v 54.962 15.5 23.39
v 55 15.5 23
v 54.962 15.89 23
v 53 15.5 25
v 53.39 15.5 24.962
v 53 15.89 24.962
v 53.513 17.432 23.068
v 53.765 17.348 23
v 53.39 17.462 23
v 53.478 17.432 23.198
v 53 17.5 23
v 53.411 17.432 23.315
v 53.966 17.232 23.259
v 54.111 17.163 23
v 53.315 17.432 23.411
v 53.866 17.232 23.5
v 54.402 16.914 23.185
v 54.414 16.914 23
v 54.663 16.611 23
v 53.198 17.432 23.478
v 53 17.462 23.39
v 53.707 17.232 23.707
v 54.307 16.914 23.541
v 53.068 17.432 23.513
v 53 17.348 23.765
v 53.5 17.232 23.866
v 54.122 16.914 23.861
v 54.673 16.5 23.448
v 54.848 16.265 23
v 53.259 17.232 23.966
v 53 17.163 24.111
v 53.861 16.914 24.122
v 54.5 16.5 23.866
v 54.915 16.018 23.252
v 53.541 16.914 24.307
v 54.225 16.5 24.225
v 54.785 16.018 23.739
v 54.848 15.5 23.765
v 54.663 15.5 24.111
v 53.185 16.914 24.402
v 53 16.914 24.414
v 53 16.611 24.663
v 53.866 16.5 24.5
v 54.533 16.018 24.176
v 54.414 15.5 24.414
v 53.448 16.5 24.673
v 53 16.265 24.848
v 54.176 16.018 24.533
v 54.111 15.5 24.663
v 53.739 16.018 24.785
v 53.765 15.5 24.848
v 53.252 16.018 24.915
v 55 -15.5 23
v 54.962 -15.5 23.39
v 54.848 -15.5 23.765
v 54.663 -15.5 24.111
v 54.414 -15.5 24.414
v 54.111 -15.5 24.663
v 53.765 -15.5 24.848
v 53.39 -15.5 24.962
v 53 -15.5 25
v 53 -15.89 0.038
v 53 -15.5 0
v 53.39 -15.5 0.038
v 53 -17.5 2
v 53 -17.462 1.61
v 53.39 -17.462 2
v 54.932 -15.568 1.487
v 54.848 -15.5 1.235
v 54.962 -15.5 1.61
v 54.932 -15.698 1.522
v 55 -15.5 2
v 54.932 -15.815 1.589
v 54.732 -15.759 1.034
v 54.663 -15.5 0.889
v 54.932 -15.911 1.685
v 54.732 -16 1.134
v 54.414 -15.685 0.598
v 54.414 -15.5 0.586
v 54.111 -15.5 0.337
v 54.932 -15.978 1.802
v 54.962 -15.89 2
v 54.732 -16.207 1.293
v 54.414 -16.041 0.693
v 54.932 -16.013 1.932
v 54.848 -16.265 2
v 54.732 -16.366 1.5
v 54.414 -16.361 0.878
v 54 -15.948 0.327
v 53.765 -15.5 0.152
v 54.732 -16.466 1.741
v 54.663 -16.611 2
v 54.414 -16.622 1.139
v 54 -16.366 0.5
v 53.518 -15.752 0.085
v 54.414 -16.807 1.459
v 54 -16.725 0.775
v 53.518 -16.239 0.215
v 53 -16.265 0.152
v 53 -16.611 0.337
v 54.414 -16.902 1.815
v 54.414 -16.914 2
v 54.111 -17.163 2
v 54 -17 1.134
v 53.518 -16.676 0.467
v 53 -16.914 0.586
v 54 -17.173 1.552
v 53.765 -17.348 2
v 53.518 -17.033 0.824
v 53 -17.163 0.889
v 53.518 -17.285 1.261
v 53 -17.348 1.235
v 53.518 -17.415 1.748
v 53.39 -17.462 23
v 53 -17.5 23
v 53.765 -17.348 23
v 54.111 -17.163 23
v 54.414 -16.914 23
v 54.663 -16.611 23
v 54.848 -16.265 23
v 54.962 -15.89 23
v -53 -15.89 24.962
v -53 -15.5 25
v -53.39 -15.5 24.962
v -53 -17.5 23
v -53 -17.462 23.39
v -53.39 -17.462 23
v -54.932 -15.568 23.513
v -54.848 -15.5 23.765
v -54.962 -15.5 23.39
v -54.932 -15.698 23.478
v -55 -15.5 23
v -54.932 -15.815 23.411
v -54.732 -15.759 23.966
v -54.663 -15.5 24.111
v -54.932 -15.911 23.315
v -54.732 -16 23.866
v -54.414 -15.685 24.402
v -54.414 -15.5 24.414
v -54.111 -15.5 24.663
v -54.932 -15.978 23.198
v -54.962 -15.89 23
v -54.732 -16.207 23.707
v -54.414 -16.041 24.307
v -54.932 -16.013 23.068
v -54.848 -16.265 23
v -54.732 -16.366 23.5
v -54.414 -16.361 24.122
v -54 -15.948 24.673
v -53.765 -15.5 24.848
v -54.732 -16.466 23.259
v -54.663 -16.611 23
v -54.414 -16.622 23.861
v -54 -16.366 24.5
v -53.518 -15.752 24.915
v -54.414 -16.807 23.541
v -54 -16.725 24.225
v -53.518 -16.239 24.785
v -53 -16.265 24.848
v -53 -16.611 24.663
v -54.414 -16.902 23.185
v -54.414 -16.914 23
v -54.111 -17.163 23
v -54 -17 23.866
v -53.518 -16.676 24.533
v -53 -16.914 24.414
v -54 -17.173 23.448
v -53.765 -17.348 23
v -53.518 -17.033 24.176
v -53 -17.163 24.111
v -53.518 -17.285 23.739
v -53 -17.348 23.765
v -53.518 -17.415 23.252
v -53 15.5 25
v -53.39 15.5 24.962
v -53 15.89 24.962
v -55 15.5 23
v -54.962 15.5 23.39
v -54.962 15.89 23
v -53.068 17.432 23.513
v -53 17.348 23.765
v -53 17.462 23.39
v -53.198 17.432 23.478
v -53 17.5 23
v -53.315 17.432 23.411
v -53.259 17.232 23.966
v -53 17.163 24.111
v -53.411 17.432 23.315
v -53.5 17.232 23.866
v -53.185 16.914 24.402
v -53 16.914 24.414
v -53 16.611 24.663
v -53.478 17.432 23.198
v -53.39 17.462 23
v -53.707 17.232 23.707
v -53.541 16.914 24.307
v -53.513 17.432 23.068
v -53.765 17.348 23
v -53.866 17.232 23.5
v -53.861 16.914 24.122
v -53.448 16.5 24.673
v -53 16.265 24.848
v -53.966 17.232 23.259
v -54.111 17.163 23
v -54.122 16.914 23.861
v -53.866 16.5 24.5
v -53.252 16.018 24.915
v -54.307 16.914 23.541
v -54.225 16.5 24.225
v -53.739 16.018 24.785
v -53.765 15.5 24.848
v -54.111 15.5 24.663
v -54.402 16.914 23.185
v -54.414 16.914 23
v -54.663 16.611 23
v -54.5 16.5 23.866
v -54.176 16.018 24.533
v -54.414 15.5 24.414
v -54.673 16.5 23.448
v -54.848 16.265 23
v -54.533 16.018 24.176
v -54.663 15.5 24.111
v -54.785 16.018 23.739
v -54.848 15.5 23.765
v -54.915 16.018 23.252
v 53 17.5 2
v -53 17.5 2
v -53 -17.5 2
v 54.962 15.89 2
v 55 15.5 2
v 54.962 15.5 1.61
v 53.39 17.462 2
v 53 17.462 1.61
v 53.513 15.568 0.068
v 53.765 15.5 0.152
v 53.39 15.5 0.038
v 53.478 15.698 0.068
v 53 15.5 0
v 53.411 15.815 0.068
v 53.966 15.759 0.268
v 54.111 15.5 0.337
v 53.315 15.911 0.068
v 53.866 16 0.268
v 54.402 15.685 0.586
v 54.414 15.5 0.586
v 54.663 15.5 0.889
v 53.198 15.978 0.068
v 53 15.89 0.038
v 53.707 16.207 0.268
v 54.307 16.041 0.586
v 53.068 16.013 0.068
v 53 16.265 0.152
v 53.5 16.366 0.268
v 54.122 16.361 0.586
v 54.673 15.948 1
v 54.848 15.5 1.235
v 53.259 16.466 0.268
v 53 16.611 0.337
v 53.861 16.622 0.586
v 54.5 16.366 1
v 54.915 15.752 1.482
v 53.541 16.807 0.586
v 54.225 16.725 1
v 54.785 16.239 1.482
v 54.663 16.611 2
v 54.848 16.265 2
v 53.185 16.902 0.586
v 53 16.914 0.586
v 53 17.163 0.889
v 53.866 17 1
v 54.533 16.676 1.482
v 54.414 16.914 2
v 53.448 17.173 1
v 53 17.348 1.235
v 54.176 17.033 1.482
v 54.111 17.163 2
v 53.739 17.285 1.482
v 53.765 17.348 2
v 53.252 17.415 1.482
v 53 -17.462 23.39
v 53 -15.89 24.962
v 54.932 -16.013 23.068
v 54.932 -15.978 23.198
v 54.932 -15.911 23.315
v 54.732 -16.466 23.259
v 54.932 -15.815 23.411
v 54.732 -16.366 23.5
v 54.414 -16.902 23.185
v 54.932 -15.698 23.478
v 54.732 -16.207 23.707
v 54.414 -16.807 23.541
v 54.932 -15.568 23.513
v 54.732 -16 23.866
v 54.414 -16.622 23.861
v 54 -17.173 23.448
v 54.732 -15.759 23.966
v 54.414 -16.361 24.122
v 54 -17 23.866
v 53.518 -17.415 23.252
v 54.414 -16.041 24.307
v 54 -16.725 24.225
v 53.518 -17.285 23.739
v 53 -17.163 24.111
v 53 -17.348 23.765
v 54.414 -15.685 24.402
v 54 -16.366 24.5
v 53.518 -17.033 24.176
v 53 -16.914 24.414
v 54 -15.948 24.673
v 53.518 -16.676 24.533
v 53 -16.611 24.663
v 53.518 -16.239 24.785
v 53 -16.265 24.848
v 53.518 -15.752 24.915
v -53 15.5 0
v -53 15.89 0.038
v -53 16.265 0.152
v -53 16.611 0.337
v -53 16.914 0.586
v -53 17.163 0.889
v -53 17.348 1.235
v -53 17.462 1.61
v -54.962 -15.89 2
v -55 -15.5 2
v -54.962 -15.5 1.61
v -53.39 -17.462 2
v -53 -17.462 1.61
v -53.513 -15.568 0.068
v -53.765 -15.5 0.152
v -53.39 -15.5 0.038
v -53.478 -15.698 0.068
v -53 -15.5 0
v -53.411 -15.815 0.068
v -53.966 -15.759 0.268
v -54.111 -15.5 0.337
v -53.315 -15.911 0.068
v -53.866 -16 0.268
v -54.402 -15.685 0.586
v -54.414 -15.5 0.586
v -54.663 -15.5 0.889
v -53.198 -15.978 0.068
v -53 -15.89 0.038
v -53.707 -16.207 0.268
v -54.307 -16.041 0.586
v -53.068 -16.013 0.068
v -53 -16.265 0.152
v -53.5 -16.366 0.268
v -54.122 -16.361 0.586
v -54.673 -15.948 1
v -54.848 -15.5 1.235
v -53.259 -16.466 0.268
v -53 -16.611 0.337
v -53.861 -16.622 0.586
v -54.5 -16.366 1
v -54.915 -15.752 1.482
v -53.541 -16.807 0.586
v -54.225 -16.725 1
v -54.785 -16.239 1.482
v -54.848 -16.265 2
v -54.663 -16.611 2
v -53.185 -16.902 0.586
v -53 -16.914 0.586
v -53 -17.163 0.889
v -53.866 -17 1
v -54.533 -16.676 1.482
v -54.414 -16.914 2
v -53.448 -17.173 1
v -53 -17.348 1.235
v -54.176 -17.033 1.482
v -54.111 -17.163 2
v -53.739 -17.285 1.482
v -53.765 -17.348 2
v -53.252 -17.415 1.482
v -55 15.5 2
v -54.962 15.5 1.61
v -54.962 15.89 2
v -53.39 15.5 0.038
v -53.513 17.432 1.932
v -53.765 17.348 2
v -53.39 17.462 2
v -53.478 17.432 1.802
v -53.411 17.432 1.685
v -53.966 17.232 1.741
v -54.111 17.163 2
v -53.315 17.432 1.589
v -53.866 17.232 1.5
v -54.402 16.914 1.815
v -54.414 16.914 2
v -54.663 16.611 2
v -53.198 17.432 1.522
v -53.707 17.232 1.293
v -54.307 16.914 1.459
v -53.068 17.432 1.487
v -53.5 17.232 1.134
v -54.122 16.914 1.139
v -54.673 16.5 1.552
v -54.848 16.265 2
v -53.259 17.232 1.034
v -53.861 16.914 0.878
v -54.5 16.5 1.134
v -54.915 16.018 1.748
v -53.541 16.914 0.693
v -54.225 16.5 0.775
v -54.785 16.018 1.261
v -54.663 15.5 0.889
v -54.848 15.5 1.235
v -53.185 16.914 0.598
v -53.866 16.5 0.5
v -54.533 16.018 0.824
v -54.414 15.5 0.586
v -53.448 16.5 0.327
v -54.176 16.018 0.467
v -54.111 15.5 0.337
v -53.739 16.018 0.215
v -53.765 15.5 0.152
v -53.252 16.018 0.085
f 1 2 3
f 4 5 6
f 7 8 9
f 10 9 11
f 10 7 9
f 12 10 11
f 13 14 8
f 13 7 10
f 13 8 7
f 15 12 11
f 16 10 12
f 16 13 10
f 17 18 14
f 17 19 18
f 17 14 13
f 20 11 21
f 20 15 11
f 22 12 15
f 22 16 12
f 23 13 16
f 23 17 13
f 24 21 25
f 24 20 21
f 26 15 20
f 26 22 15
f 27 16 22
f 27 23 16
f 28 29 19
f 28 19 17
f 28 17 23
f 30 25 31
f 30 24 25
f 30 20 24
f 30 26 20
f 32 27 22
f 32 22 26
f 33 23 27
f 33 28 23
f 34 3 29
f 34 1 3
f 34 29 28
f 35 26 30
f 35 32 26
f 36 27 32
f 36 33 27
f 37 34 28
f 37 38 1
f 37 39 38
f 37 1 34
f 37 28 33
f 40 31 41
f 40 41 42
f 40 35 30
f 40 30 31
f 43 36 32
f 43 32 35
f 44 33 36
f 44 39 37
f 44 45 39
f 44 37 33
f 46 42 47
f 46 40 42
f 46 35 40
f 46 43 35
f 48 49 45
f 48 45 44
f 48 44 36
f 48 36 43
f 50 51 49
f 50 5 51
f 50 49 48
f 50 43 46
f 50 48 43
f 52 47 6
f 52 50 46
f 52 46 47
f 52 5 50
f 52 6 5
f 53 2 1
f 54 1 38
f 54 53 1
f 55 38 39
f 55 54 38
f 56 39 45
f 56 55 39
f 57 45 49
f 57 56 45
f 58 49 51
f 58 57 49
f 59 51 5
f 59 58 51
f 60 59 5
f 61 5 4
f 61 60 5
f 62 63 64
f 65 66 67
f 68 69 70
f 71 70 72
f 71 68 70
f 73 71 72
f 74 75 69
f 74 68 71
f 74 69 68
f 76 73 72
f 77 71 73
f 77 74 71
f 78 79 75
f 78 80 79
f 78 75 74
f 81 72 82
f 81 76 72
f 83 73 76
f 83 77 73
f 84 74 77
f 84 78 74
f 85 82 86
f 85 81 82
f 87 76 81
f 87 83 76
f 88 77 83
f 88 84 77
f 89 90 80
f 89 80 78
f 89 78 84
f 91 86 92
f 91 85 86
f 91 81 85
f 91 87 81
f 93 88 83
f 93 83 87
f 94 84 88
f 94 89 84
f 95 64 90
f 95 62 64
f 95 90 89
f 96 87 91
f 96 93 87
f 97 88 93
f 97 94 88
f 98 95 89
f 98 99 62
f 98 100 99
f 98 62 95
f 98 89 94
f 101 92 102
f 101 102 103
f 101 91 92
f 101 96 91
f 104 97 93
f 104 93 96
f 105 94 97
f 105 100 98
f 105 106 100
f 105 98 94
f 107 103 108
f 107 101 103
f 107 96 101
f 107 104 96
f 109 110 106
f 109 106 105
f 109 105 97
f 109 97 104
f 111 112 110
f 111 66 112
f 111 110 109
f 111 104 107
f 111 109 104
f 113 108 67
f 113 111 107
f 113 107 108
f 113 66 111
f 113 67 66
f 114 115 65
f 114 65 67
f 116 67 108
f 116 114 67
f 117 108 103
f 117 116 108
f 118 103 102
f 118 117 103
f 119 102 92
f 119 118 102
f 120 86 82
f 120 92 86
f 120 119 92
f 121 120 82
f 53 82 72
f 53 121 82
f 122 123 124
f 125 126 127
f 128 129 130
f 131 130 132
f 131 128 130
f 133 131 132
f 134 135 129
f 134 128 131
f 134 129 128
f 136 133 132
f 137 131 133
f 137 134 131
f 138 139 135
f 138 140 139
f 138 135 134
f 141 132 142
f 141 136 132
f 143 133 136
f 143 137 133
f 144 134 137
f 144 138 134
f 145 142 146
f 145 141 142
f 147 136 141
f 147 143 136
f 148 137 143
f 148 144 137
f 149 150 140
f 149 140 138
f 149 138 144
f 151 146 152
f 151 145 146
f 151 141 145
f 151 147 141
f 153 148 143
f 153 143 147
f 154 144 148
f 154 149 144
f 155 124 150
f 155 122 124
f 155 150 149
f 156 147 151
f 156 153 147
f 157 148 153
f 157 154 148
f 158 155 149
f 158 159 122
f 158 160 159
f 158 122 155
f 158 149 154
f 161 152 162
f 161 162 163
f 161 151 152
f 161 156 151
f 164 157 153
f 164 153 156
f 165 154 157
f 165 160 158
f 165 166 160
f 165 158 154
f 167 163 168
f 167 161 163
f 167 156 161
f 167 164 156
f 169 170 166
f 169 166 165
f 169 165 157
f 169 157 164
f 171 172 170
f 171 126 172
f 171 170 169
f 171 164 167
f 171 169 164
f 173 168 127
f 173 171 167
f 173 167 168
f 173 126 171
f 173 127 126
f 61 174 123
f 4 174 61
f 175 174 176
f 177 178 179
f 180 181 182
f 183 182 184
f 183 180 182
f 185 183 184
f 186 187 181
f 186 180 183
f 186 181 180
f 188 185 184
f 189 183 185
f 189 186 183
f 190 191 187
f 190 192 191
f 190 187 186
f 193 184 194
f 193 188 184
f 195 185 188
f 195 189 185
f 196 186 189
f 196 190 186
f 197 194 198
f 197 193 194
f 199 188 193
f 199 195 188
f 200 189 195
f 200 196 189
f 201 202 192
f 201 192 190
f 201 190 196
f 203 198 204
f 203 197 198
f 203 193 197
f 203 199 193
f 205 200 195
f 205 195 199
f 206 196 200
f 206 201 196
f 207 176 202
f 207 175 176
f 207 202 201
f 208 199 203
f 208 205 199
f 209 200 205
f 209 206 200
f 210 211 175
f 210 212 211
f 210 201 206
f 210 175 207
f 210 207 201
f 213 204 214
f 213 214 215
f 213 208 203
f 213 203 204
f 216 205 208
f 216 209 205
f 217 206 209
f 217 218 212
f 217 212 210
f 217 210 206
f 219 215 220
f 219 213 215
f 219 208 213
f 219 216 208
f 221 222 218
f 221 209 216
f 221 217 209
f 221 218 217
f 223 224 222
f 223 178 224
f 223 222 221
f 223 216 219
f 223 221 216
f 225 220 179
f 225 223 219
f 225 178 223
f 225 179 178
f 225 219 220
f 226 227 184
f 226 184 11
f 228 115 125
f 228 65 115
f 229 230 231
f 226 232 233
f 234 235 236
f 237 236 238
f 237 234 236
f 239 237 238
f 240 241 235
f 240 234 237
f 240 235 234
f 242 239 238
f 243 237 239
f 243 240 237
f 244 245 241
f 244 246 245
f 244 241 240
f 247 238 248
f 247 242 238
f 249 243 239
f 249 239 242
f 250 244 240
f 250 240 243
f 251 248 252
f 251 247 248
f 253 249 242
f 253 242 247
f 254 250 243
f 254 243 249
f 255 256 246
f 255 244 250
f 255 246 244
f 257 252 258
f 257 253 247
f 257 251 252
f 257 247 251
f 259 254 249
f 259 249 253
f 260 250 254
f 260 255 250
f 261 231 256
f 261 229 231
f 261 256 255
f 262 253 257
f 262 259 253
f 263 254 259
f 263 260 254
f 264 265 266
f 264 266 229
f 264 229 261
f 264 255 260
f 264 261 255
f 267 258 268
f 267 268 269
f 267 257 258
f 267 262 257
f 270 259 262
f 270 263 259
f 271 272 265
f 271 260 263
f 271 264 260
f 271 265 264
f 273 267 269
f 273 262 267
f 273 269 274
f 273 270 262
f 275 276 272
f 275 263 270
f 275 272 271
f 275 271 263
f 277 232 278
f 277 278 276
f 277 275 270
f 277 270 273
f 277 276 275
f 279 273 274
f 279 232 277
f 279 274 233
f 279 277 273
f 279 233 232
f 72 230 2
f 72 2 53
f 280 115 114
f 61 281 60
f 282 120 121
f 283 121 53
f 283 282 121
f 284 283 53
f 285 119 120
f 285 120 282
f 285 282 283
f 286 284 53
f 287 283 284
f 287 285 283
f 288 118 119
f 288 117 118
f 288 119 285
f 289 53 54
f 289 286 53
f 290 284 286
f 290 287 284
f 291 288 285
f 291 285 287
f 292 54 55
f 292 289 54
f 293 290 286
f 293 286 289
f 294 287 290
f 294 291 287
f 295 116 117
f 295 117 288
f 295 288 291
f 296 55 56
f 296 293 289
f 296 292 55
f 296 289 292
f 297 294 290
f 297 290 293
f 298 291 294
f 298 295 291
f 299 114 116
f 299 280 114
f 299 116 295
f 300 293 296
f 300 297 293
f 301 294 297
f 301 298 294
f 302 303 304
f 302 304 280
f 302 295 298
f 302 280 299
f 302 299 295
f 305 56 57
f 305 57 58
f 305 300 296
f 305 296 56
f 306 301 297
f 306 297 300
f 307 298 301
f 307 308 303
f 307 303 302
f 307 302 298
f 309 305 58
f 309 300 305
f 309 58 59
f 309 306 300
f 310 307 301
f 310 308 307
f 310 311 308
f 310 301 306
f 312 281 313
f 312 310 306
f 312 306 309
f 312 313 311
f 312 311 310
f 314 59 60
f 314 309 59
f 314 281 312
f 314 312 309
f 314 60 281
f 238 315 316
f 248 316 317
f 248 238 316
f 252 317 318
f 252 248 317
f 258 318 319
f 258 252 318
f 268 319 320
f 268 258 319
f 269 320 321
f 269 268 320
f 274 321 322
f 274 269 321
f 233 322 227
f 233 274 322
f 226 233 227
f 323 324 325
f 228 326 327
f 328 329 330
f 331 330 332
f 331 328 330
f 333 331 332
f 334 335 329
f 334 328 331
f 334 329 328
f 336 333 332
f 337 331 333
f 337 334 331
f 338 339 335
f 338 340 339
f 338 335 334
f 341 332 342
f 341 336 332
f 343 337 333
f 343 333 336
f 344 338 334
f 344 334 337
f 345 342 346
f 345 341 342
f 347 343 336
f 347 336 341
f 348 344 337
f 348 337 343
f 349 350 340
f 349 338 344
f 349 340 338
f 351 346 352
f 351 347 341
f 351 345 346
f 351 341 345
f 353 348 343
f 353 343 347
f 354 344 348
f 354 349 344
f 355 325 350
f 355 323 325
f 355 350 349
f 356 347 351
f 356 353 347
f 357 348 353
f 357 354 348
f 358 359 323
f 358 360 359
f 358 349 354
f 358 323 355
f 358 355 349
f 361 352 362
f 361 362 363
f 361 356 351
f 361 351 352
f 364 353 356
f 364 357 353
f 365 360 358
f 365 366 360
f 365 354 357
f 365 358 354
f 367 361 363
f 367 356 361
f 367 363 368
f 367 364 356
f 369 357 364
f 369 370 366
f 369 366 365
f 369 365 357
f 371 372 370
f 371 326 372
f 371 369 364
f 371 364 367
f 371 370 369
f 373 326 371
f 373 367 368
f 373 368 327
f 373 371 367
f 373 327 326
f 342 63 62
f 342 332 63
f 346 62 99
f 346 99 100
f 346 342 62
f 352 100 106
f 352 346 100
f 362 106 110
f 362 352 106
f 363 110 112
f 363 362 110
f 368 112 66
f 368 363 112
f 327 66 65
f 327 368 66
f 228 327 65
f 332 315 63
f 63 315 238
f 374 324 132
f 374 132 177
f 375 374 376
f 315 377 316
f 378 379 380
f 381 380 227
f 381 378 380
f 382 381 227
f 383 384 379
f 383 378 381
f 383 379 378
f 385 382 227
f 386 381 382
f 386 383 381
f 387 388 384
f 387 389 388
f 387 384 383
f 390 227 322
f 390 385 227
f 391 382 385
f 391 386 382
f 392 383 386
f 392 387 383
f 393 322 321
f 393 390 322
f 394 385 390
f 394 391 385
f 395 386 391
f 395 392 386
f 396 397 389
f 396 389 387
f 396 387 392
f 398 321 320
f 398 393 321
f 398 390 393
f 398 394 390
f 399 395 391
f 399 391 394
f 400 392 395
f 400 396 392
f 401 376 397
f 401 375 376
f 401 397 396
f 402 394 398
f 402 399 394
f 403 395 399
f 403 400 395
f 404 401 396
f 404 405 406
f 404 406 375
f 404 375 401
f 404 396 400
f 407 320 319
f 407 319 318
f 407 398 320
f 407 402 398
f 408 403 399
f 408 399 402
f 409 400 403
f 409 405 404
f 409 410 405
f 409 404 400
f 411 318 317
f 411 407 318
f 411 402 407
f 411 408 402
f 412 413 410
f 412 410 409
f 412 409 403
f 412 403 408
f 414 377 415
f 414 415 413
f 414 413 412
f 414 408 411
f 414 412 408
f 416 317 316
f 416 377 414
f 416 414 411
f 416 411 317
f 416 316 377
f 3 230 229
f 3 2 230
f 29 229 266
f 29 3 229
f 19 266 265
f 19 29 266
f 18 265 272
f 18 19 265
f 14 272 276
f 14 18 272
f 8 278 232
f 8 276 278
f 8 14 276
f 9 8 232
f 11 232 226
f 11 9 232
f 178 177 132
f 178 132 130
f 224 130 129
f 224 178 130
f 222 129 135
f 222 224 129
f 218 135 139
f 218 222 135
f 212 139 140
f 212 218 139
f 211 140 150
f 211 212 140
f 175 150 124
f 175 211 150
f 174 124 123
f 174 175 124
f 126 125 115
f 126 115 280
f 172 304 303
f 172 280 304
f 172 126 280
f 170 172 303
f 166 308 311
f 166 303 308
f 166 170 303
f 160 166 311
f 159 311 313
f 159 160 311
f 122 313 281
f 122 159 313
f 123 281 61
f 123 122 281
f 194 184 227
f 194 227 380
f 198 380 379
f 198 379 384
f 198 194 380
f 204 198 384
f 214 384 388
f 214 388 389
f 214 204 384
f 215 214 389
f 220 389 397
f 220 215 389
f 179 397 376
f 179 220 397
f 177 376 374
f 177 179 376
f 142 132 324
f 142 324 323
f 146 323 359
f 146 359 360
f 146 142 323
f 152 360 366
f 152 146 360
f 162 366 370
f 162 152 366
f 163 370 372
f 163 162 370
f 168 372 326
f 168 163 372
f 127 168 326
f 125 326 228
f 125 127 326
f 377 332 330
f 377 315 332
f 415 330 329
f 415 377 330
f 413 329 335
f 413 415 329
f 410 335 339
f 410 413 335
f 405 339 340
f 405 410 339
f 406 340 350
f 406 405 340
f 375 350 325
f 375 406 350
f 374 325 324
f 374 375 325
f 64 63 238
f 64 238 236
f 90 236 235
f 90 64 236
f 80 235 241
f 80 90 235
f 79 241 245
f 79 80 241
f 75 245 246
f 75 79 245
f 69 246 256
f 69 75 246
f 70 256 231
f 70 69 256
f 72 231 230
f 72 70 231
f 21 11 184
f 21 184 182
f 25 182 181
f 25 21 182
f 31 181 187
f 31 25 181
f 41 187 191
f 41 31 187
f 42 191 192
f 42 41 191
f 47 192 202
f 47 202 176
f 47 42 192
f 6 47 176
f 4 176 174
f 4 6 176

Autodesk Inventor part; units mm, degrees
ref_plane "YZ Plane" through (0, 0, 0) normal (1, 0, 0) x (0, 1, 0)
ref_plane "XZ Plane" through (0, 0, 0) normal (0, 1, 0) x (-1, 0, 0)
ref_plane "XY Plane" through (0, 0, 0) normal (0, 0, 1) x (1, 0, 0)
sketch "Sketch2" plane through (0, 0, 0) normal (0, 0, 1) x (1, 0, 0)
  line L0 (-55, 17.5) -> (55, 17.5)
  line L1 (55, 17.5) -> (55, -17.5)
  line L2 (55, -17.5) -> (-55, -17.5)
  line L3 (-55, -17.5) -> (-55, 17.5)
  line L4 (-55, 17.5) -> (55, -17.5) construction
  line L5 (55, 17.5) -> (-55, -17.5) construction
  point P0 (0, 0)
  dimension "d0" = 110
  dimension "d1" = 35
extrude "Extrusion1" add sketch "Sketch2" along normal blind 25
fillet "Fillet1" radius 2 12 edges at (0, -17.5, 25) (-55, 0, 25) (-55, -17.5, 12.5) (-55, 0, 0) (0, -17.5, 0) (55, 0, 25) (55, 17.5, 12.5) (0, 17.5, 25) (0, 17.5, 0) (55, 0, 0) (55, -17.5, 12.5) (-55, 17.5, 12.5)
properties part number "Lipo 3S Battery"
